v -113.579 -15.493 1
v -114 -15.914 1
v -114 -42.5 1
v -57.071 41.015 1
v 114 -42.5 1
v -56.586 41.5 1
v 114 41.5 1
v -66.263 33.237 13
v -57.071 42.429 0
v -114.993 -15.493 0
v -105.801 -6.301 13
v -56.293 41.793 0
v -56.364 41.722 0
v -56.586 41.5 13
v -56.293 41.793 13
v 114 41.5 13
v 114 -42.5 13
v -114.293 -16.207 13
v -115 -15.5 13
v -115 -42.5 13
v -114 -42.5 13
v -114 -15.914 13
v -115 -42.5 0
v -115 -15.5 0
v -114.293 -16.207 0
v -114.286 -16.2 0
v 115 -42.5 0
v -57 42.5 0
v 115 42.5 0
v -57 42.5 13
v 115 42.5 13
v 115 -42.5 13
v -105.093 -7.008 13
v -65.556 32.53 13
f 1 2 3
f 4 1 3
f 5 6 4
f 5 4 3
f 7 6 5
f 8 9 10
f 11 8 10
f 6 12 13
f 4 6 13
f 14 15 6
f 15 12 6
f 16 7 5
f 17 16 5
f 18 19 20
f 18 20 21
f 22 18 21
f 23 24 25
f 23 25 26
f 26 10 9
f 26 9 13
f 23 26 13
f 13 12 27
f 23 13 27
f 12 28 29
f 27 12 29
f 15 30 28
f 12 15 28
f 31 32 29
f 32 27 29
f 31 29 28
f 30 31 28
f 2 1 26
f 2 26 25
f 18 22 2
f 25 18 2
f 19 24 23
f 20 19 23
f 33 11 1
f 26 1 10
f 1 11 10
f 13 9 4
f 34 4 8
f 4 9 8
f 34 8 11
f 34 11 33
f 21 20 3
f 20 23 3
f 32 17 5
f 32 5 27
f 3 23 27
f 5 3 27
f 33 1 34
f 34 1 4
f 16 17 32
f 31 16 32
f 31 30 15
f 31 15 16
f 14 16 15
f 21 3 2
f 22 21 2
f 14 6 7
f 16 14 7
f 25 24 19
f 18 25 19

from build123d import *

# Parameters (mm, degrees)
F1_DEPTH = 1
F3_DEPTH = 12
F5_DEPTH = 1


with BuildPart() as f1:
    # F0 (on Top) → F1 (new body)
    with BuildSketch(Plane.XY):
        Polygon((-115, -42.5), (115, -42.5), (115, 42.5), (-57, 42.5), (-115, -15.5), align=None)
    extrude(amount=F1_DEPTH)

    # F2 (on face) → F3 (join)
    with BuildSketch(Plane.XY.offset(1)):
        Polygon((-115, -15.5), (-115, -42.5), (-114, -42.5), (-114, -15.9142135624), (-56.5857864376, 41.5), (114, 41.5), (114, -42.5), (115, -42.5), (115, 42.5), (-57, 42.5), align=None)
    extrude(amount=F3_DEPTH)

    # F4 (on face) → F5 (cut)
    with BuildSketch(Plane(origin=(-49.75, 49.75, 0), x_dir=(-0.7071067812, -0.7071067812, 0), z_dir=(-0.7071067812, 0.7071067812, 0))):
        Polygon((92.2674349448, 0), (92.2774349448, 0), (92.2774349448, 13), (79.2674349448, 13), align=None)
        Polygon((23.3530483272, 13), (10.2530483272, 13), (10.2530483272, 0), (10.3530483272, 0), align=None)
    extrude(amount=-F5_DEPTH, mode=Mode.SUBTRACT)


solid = f1.part
